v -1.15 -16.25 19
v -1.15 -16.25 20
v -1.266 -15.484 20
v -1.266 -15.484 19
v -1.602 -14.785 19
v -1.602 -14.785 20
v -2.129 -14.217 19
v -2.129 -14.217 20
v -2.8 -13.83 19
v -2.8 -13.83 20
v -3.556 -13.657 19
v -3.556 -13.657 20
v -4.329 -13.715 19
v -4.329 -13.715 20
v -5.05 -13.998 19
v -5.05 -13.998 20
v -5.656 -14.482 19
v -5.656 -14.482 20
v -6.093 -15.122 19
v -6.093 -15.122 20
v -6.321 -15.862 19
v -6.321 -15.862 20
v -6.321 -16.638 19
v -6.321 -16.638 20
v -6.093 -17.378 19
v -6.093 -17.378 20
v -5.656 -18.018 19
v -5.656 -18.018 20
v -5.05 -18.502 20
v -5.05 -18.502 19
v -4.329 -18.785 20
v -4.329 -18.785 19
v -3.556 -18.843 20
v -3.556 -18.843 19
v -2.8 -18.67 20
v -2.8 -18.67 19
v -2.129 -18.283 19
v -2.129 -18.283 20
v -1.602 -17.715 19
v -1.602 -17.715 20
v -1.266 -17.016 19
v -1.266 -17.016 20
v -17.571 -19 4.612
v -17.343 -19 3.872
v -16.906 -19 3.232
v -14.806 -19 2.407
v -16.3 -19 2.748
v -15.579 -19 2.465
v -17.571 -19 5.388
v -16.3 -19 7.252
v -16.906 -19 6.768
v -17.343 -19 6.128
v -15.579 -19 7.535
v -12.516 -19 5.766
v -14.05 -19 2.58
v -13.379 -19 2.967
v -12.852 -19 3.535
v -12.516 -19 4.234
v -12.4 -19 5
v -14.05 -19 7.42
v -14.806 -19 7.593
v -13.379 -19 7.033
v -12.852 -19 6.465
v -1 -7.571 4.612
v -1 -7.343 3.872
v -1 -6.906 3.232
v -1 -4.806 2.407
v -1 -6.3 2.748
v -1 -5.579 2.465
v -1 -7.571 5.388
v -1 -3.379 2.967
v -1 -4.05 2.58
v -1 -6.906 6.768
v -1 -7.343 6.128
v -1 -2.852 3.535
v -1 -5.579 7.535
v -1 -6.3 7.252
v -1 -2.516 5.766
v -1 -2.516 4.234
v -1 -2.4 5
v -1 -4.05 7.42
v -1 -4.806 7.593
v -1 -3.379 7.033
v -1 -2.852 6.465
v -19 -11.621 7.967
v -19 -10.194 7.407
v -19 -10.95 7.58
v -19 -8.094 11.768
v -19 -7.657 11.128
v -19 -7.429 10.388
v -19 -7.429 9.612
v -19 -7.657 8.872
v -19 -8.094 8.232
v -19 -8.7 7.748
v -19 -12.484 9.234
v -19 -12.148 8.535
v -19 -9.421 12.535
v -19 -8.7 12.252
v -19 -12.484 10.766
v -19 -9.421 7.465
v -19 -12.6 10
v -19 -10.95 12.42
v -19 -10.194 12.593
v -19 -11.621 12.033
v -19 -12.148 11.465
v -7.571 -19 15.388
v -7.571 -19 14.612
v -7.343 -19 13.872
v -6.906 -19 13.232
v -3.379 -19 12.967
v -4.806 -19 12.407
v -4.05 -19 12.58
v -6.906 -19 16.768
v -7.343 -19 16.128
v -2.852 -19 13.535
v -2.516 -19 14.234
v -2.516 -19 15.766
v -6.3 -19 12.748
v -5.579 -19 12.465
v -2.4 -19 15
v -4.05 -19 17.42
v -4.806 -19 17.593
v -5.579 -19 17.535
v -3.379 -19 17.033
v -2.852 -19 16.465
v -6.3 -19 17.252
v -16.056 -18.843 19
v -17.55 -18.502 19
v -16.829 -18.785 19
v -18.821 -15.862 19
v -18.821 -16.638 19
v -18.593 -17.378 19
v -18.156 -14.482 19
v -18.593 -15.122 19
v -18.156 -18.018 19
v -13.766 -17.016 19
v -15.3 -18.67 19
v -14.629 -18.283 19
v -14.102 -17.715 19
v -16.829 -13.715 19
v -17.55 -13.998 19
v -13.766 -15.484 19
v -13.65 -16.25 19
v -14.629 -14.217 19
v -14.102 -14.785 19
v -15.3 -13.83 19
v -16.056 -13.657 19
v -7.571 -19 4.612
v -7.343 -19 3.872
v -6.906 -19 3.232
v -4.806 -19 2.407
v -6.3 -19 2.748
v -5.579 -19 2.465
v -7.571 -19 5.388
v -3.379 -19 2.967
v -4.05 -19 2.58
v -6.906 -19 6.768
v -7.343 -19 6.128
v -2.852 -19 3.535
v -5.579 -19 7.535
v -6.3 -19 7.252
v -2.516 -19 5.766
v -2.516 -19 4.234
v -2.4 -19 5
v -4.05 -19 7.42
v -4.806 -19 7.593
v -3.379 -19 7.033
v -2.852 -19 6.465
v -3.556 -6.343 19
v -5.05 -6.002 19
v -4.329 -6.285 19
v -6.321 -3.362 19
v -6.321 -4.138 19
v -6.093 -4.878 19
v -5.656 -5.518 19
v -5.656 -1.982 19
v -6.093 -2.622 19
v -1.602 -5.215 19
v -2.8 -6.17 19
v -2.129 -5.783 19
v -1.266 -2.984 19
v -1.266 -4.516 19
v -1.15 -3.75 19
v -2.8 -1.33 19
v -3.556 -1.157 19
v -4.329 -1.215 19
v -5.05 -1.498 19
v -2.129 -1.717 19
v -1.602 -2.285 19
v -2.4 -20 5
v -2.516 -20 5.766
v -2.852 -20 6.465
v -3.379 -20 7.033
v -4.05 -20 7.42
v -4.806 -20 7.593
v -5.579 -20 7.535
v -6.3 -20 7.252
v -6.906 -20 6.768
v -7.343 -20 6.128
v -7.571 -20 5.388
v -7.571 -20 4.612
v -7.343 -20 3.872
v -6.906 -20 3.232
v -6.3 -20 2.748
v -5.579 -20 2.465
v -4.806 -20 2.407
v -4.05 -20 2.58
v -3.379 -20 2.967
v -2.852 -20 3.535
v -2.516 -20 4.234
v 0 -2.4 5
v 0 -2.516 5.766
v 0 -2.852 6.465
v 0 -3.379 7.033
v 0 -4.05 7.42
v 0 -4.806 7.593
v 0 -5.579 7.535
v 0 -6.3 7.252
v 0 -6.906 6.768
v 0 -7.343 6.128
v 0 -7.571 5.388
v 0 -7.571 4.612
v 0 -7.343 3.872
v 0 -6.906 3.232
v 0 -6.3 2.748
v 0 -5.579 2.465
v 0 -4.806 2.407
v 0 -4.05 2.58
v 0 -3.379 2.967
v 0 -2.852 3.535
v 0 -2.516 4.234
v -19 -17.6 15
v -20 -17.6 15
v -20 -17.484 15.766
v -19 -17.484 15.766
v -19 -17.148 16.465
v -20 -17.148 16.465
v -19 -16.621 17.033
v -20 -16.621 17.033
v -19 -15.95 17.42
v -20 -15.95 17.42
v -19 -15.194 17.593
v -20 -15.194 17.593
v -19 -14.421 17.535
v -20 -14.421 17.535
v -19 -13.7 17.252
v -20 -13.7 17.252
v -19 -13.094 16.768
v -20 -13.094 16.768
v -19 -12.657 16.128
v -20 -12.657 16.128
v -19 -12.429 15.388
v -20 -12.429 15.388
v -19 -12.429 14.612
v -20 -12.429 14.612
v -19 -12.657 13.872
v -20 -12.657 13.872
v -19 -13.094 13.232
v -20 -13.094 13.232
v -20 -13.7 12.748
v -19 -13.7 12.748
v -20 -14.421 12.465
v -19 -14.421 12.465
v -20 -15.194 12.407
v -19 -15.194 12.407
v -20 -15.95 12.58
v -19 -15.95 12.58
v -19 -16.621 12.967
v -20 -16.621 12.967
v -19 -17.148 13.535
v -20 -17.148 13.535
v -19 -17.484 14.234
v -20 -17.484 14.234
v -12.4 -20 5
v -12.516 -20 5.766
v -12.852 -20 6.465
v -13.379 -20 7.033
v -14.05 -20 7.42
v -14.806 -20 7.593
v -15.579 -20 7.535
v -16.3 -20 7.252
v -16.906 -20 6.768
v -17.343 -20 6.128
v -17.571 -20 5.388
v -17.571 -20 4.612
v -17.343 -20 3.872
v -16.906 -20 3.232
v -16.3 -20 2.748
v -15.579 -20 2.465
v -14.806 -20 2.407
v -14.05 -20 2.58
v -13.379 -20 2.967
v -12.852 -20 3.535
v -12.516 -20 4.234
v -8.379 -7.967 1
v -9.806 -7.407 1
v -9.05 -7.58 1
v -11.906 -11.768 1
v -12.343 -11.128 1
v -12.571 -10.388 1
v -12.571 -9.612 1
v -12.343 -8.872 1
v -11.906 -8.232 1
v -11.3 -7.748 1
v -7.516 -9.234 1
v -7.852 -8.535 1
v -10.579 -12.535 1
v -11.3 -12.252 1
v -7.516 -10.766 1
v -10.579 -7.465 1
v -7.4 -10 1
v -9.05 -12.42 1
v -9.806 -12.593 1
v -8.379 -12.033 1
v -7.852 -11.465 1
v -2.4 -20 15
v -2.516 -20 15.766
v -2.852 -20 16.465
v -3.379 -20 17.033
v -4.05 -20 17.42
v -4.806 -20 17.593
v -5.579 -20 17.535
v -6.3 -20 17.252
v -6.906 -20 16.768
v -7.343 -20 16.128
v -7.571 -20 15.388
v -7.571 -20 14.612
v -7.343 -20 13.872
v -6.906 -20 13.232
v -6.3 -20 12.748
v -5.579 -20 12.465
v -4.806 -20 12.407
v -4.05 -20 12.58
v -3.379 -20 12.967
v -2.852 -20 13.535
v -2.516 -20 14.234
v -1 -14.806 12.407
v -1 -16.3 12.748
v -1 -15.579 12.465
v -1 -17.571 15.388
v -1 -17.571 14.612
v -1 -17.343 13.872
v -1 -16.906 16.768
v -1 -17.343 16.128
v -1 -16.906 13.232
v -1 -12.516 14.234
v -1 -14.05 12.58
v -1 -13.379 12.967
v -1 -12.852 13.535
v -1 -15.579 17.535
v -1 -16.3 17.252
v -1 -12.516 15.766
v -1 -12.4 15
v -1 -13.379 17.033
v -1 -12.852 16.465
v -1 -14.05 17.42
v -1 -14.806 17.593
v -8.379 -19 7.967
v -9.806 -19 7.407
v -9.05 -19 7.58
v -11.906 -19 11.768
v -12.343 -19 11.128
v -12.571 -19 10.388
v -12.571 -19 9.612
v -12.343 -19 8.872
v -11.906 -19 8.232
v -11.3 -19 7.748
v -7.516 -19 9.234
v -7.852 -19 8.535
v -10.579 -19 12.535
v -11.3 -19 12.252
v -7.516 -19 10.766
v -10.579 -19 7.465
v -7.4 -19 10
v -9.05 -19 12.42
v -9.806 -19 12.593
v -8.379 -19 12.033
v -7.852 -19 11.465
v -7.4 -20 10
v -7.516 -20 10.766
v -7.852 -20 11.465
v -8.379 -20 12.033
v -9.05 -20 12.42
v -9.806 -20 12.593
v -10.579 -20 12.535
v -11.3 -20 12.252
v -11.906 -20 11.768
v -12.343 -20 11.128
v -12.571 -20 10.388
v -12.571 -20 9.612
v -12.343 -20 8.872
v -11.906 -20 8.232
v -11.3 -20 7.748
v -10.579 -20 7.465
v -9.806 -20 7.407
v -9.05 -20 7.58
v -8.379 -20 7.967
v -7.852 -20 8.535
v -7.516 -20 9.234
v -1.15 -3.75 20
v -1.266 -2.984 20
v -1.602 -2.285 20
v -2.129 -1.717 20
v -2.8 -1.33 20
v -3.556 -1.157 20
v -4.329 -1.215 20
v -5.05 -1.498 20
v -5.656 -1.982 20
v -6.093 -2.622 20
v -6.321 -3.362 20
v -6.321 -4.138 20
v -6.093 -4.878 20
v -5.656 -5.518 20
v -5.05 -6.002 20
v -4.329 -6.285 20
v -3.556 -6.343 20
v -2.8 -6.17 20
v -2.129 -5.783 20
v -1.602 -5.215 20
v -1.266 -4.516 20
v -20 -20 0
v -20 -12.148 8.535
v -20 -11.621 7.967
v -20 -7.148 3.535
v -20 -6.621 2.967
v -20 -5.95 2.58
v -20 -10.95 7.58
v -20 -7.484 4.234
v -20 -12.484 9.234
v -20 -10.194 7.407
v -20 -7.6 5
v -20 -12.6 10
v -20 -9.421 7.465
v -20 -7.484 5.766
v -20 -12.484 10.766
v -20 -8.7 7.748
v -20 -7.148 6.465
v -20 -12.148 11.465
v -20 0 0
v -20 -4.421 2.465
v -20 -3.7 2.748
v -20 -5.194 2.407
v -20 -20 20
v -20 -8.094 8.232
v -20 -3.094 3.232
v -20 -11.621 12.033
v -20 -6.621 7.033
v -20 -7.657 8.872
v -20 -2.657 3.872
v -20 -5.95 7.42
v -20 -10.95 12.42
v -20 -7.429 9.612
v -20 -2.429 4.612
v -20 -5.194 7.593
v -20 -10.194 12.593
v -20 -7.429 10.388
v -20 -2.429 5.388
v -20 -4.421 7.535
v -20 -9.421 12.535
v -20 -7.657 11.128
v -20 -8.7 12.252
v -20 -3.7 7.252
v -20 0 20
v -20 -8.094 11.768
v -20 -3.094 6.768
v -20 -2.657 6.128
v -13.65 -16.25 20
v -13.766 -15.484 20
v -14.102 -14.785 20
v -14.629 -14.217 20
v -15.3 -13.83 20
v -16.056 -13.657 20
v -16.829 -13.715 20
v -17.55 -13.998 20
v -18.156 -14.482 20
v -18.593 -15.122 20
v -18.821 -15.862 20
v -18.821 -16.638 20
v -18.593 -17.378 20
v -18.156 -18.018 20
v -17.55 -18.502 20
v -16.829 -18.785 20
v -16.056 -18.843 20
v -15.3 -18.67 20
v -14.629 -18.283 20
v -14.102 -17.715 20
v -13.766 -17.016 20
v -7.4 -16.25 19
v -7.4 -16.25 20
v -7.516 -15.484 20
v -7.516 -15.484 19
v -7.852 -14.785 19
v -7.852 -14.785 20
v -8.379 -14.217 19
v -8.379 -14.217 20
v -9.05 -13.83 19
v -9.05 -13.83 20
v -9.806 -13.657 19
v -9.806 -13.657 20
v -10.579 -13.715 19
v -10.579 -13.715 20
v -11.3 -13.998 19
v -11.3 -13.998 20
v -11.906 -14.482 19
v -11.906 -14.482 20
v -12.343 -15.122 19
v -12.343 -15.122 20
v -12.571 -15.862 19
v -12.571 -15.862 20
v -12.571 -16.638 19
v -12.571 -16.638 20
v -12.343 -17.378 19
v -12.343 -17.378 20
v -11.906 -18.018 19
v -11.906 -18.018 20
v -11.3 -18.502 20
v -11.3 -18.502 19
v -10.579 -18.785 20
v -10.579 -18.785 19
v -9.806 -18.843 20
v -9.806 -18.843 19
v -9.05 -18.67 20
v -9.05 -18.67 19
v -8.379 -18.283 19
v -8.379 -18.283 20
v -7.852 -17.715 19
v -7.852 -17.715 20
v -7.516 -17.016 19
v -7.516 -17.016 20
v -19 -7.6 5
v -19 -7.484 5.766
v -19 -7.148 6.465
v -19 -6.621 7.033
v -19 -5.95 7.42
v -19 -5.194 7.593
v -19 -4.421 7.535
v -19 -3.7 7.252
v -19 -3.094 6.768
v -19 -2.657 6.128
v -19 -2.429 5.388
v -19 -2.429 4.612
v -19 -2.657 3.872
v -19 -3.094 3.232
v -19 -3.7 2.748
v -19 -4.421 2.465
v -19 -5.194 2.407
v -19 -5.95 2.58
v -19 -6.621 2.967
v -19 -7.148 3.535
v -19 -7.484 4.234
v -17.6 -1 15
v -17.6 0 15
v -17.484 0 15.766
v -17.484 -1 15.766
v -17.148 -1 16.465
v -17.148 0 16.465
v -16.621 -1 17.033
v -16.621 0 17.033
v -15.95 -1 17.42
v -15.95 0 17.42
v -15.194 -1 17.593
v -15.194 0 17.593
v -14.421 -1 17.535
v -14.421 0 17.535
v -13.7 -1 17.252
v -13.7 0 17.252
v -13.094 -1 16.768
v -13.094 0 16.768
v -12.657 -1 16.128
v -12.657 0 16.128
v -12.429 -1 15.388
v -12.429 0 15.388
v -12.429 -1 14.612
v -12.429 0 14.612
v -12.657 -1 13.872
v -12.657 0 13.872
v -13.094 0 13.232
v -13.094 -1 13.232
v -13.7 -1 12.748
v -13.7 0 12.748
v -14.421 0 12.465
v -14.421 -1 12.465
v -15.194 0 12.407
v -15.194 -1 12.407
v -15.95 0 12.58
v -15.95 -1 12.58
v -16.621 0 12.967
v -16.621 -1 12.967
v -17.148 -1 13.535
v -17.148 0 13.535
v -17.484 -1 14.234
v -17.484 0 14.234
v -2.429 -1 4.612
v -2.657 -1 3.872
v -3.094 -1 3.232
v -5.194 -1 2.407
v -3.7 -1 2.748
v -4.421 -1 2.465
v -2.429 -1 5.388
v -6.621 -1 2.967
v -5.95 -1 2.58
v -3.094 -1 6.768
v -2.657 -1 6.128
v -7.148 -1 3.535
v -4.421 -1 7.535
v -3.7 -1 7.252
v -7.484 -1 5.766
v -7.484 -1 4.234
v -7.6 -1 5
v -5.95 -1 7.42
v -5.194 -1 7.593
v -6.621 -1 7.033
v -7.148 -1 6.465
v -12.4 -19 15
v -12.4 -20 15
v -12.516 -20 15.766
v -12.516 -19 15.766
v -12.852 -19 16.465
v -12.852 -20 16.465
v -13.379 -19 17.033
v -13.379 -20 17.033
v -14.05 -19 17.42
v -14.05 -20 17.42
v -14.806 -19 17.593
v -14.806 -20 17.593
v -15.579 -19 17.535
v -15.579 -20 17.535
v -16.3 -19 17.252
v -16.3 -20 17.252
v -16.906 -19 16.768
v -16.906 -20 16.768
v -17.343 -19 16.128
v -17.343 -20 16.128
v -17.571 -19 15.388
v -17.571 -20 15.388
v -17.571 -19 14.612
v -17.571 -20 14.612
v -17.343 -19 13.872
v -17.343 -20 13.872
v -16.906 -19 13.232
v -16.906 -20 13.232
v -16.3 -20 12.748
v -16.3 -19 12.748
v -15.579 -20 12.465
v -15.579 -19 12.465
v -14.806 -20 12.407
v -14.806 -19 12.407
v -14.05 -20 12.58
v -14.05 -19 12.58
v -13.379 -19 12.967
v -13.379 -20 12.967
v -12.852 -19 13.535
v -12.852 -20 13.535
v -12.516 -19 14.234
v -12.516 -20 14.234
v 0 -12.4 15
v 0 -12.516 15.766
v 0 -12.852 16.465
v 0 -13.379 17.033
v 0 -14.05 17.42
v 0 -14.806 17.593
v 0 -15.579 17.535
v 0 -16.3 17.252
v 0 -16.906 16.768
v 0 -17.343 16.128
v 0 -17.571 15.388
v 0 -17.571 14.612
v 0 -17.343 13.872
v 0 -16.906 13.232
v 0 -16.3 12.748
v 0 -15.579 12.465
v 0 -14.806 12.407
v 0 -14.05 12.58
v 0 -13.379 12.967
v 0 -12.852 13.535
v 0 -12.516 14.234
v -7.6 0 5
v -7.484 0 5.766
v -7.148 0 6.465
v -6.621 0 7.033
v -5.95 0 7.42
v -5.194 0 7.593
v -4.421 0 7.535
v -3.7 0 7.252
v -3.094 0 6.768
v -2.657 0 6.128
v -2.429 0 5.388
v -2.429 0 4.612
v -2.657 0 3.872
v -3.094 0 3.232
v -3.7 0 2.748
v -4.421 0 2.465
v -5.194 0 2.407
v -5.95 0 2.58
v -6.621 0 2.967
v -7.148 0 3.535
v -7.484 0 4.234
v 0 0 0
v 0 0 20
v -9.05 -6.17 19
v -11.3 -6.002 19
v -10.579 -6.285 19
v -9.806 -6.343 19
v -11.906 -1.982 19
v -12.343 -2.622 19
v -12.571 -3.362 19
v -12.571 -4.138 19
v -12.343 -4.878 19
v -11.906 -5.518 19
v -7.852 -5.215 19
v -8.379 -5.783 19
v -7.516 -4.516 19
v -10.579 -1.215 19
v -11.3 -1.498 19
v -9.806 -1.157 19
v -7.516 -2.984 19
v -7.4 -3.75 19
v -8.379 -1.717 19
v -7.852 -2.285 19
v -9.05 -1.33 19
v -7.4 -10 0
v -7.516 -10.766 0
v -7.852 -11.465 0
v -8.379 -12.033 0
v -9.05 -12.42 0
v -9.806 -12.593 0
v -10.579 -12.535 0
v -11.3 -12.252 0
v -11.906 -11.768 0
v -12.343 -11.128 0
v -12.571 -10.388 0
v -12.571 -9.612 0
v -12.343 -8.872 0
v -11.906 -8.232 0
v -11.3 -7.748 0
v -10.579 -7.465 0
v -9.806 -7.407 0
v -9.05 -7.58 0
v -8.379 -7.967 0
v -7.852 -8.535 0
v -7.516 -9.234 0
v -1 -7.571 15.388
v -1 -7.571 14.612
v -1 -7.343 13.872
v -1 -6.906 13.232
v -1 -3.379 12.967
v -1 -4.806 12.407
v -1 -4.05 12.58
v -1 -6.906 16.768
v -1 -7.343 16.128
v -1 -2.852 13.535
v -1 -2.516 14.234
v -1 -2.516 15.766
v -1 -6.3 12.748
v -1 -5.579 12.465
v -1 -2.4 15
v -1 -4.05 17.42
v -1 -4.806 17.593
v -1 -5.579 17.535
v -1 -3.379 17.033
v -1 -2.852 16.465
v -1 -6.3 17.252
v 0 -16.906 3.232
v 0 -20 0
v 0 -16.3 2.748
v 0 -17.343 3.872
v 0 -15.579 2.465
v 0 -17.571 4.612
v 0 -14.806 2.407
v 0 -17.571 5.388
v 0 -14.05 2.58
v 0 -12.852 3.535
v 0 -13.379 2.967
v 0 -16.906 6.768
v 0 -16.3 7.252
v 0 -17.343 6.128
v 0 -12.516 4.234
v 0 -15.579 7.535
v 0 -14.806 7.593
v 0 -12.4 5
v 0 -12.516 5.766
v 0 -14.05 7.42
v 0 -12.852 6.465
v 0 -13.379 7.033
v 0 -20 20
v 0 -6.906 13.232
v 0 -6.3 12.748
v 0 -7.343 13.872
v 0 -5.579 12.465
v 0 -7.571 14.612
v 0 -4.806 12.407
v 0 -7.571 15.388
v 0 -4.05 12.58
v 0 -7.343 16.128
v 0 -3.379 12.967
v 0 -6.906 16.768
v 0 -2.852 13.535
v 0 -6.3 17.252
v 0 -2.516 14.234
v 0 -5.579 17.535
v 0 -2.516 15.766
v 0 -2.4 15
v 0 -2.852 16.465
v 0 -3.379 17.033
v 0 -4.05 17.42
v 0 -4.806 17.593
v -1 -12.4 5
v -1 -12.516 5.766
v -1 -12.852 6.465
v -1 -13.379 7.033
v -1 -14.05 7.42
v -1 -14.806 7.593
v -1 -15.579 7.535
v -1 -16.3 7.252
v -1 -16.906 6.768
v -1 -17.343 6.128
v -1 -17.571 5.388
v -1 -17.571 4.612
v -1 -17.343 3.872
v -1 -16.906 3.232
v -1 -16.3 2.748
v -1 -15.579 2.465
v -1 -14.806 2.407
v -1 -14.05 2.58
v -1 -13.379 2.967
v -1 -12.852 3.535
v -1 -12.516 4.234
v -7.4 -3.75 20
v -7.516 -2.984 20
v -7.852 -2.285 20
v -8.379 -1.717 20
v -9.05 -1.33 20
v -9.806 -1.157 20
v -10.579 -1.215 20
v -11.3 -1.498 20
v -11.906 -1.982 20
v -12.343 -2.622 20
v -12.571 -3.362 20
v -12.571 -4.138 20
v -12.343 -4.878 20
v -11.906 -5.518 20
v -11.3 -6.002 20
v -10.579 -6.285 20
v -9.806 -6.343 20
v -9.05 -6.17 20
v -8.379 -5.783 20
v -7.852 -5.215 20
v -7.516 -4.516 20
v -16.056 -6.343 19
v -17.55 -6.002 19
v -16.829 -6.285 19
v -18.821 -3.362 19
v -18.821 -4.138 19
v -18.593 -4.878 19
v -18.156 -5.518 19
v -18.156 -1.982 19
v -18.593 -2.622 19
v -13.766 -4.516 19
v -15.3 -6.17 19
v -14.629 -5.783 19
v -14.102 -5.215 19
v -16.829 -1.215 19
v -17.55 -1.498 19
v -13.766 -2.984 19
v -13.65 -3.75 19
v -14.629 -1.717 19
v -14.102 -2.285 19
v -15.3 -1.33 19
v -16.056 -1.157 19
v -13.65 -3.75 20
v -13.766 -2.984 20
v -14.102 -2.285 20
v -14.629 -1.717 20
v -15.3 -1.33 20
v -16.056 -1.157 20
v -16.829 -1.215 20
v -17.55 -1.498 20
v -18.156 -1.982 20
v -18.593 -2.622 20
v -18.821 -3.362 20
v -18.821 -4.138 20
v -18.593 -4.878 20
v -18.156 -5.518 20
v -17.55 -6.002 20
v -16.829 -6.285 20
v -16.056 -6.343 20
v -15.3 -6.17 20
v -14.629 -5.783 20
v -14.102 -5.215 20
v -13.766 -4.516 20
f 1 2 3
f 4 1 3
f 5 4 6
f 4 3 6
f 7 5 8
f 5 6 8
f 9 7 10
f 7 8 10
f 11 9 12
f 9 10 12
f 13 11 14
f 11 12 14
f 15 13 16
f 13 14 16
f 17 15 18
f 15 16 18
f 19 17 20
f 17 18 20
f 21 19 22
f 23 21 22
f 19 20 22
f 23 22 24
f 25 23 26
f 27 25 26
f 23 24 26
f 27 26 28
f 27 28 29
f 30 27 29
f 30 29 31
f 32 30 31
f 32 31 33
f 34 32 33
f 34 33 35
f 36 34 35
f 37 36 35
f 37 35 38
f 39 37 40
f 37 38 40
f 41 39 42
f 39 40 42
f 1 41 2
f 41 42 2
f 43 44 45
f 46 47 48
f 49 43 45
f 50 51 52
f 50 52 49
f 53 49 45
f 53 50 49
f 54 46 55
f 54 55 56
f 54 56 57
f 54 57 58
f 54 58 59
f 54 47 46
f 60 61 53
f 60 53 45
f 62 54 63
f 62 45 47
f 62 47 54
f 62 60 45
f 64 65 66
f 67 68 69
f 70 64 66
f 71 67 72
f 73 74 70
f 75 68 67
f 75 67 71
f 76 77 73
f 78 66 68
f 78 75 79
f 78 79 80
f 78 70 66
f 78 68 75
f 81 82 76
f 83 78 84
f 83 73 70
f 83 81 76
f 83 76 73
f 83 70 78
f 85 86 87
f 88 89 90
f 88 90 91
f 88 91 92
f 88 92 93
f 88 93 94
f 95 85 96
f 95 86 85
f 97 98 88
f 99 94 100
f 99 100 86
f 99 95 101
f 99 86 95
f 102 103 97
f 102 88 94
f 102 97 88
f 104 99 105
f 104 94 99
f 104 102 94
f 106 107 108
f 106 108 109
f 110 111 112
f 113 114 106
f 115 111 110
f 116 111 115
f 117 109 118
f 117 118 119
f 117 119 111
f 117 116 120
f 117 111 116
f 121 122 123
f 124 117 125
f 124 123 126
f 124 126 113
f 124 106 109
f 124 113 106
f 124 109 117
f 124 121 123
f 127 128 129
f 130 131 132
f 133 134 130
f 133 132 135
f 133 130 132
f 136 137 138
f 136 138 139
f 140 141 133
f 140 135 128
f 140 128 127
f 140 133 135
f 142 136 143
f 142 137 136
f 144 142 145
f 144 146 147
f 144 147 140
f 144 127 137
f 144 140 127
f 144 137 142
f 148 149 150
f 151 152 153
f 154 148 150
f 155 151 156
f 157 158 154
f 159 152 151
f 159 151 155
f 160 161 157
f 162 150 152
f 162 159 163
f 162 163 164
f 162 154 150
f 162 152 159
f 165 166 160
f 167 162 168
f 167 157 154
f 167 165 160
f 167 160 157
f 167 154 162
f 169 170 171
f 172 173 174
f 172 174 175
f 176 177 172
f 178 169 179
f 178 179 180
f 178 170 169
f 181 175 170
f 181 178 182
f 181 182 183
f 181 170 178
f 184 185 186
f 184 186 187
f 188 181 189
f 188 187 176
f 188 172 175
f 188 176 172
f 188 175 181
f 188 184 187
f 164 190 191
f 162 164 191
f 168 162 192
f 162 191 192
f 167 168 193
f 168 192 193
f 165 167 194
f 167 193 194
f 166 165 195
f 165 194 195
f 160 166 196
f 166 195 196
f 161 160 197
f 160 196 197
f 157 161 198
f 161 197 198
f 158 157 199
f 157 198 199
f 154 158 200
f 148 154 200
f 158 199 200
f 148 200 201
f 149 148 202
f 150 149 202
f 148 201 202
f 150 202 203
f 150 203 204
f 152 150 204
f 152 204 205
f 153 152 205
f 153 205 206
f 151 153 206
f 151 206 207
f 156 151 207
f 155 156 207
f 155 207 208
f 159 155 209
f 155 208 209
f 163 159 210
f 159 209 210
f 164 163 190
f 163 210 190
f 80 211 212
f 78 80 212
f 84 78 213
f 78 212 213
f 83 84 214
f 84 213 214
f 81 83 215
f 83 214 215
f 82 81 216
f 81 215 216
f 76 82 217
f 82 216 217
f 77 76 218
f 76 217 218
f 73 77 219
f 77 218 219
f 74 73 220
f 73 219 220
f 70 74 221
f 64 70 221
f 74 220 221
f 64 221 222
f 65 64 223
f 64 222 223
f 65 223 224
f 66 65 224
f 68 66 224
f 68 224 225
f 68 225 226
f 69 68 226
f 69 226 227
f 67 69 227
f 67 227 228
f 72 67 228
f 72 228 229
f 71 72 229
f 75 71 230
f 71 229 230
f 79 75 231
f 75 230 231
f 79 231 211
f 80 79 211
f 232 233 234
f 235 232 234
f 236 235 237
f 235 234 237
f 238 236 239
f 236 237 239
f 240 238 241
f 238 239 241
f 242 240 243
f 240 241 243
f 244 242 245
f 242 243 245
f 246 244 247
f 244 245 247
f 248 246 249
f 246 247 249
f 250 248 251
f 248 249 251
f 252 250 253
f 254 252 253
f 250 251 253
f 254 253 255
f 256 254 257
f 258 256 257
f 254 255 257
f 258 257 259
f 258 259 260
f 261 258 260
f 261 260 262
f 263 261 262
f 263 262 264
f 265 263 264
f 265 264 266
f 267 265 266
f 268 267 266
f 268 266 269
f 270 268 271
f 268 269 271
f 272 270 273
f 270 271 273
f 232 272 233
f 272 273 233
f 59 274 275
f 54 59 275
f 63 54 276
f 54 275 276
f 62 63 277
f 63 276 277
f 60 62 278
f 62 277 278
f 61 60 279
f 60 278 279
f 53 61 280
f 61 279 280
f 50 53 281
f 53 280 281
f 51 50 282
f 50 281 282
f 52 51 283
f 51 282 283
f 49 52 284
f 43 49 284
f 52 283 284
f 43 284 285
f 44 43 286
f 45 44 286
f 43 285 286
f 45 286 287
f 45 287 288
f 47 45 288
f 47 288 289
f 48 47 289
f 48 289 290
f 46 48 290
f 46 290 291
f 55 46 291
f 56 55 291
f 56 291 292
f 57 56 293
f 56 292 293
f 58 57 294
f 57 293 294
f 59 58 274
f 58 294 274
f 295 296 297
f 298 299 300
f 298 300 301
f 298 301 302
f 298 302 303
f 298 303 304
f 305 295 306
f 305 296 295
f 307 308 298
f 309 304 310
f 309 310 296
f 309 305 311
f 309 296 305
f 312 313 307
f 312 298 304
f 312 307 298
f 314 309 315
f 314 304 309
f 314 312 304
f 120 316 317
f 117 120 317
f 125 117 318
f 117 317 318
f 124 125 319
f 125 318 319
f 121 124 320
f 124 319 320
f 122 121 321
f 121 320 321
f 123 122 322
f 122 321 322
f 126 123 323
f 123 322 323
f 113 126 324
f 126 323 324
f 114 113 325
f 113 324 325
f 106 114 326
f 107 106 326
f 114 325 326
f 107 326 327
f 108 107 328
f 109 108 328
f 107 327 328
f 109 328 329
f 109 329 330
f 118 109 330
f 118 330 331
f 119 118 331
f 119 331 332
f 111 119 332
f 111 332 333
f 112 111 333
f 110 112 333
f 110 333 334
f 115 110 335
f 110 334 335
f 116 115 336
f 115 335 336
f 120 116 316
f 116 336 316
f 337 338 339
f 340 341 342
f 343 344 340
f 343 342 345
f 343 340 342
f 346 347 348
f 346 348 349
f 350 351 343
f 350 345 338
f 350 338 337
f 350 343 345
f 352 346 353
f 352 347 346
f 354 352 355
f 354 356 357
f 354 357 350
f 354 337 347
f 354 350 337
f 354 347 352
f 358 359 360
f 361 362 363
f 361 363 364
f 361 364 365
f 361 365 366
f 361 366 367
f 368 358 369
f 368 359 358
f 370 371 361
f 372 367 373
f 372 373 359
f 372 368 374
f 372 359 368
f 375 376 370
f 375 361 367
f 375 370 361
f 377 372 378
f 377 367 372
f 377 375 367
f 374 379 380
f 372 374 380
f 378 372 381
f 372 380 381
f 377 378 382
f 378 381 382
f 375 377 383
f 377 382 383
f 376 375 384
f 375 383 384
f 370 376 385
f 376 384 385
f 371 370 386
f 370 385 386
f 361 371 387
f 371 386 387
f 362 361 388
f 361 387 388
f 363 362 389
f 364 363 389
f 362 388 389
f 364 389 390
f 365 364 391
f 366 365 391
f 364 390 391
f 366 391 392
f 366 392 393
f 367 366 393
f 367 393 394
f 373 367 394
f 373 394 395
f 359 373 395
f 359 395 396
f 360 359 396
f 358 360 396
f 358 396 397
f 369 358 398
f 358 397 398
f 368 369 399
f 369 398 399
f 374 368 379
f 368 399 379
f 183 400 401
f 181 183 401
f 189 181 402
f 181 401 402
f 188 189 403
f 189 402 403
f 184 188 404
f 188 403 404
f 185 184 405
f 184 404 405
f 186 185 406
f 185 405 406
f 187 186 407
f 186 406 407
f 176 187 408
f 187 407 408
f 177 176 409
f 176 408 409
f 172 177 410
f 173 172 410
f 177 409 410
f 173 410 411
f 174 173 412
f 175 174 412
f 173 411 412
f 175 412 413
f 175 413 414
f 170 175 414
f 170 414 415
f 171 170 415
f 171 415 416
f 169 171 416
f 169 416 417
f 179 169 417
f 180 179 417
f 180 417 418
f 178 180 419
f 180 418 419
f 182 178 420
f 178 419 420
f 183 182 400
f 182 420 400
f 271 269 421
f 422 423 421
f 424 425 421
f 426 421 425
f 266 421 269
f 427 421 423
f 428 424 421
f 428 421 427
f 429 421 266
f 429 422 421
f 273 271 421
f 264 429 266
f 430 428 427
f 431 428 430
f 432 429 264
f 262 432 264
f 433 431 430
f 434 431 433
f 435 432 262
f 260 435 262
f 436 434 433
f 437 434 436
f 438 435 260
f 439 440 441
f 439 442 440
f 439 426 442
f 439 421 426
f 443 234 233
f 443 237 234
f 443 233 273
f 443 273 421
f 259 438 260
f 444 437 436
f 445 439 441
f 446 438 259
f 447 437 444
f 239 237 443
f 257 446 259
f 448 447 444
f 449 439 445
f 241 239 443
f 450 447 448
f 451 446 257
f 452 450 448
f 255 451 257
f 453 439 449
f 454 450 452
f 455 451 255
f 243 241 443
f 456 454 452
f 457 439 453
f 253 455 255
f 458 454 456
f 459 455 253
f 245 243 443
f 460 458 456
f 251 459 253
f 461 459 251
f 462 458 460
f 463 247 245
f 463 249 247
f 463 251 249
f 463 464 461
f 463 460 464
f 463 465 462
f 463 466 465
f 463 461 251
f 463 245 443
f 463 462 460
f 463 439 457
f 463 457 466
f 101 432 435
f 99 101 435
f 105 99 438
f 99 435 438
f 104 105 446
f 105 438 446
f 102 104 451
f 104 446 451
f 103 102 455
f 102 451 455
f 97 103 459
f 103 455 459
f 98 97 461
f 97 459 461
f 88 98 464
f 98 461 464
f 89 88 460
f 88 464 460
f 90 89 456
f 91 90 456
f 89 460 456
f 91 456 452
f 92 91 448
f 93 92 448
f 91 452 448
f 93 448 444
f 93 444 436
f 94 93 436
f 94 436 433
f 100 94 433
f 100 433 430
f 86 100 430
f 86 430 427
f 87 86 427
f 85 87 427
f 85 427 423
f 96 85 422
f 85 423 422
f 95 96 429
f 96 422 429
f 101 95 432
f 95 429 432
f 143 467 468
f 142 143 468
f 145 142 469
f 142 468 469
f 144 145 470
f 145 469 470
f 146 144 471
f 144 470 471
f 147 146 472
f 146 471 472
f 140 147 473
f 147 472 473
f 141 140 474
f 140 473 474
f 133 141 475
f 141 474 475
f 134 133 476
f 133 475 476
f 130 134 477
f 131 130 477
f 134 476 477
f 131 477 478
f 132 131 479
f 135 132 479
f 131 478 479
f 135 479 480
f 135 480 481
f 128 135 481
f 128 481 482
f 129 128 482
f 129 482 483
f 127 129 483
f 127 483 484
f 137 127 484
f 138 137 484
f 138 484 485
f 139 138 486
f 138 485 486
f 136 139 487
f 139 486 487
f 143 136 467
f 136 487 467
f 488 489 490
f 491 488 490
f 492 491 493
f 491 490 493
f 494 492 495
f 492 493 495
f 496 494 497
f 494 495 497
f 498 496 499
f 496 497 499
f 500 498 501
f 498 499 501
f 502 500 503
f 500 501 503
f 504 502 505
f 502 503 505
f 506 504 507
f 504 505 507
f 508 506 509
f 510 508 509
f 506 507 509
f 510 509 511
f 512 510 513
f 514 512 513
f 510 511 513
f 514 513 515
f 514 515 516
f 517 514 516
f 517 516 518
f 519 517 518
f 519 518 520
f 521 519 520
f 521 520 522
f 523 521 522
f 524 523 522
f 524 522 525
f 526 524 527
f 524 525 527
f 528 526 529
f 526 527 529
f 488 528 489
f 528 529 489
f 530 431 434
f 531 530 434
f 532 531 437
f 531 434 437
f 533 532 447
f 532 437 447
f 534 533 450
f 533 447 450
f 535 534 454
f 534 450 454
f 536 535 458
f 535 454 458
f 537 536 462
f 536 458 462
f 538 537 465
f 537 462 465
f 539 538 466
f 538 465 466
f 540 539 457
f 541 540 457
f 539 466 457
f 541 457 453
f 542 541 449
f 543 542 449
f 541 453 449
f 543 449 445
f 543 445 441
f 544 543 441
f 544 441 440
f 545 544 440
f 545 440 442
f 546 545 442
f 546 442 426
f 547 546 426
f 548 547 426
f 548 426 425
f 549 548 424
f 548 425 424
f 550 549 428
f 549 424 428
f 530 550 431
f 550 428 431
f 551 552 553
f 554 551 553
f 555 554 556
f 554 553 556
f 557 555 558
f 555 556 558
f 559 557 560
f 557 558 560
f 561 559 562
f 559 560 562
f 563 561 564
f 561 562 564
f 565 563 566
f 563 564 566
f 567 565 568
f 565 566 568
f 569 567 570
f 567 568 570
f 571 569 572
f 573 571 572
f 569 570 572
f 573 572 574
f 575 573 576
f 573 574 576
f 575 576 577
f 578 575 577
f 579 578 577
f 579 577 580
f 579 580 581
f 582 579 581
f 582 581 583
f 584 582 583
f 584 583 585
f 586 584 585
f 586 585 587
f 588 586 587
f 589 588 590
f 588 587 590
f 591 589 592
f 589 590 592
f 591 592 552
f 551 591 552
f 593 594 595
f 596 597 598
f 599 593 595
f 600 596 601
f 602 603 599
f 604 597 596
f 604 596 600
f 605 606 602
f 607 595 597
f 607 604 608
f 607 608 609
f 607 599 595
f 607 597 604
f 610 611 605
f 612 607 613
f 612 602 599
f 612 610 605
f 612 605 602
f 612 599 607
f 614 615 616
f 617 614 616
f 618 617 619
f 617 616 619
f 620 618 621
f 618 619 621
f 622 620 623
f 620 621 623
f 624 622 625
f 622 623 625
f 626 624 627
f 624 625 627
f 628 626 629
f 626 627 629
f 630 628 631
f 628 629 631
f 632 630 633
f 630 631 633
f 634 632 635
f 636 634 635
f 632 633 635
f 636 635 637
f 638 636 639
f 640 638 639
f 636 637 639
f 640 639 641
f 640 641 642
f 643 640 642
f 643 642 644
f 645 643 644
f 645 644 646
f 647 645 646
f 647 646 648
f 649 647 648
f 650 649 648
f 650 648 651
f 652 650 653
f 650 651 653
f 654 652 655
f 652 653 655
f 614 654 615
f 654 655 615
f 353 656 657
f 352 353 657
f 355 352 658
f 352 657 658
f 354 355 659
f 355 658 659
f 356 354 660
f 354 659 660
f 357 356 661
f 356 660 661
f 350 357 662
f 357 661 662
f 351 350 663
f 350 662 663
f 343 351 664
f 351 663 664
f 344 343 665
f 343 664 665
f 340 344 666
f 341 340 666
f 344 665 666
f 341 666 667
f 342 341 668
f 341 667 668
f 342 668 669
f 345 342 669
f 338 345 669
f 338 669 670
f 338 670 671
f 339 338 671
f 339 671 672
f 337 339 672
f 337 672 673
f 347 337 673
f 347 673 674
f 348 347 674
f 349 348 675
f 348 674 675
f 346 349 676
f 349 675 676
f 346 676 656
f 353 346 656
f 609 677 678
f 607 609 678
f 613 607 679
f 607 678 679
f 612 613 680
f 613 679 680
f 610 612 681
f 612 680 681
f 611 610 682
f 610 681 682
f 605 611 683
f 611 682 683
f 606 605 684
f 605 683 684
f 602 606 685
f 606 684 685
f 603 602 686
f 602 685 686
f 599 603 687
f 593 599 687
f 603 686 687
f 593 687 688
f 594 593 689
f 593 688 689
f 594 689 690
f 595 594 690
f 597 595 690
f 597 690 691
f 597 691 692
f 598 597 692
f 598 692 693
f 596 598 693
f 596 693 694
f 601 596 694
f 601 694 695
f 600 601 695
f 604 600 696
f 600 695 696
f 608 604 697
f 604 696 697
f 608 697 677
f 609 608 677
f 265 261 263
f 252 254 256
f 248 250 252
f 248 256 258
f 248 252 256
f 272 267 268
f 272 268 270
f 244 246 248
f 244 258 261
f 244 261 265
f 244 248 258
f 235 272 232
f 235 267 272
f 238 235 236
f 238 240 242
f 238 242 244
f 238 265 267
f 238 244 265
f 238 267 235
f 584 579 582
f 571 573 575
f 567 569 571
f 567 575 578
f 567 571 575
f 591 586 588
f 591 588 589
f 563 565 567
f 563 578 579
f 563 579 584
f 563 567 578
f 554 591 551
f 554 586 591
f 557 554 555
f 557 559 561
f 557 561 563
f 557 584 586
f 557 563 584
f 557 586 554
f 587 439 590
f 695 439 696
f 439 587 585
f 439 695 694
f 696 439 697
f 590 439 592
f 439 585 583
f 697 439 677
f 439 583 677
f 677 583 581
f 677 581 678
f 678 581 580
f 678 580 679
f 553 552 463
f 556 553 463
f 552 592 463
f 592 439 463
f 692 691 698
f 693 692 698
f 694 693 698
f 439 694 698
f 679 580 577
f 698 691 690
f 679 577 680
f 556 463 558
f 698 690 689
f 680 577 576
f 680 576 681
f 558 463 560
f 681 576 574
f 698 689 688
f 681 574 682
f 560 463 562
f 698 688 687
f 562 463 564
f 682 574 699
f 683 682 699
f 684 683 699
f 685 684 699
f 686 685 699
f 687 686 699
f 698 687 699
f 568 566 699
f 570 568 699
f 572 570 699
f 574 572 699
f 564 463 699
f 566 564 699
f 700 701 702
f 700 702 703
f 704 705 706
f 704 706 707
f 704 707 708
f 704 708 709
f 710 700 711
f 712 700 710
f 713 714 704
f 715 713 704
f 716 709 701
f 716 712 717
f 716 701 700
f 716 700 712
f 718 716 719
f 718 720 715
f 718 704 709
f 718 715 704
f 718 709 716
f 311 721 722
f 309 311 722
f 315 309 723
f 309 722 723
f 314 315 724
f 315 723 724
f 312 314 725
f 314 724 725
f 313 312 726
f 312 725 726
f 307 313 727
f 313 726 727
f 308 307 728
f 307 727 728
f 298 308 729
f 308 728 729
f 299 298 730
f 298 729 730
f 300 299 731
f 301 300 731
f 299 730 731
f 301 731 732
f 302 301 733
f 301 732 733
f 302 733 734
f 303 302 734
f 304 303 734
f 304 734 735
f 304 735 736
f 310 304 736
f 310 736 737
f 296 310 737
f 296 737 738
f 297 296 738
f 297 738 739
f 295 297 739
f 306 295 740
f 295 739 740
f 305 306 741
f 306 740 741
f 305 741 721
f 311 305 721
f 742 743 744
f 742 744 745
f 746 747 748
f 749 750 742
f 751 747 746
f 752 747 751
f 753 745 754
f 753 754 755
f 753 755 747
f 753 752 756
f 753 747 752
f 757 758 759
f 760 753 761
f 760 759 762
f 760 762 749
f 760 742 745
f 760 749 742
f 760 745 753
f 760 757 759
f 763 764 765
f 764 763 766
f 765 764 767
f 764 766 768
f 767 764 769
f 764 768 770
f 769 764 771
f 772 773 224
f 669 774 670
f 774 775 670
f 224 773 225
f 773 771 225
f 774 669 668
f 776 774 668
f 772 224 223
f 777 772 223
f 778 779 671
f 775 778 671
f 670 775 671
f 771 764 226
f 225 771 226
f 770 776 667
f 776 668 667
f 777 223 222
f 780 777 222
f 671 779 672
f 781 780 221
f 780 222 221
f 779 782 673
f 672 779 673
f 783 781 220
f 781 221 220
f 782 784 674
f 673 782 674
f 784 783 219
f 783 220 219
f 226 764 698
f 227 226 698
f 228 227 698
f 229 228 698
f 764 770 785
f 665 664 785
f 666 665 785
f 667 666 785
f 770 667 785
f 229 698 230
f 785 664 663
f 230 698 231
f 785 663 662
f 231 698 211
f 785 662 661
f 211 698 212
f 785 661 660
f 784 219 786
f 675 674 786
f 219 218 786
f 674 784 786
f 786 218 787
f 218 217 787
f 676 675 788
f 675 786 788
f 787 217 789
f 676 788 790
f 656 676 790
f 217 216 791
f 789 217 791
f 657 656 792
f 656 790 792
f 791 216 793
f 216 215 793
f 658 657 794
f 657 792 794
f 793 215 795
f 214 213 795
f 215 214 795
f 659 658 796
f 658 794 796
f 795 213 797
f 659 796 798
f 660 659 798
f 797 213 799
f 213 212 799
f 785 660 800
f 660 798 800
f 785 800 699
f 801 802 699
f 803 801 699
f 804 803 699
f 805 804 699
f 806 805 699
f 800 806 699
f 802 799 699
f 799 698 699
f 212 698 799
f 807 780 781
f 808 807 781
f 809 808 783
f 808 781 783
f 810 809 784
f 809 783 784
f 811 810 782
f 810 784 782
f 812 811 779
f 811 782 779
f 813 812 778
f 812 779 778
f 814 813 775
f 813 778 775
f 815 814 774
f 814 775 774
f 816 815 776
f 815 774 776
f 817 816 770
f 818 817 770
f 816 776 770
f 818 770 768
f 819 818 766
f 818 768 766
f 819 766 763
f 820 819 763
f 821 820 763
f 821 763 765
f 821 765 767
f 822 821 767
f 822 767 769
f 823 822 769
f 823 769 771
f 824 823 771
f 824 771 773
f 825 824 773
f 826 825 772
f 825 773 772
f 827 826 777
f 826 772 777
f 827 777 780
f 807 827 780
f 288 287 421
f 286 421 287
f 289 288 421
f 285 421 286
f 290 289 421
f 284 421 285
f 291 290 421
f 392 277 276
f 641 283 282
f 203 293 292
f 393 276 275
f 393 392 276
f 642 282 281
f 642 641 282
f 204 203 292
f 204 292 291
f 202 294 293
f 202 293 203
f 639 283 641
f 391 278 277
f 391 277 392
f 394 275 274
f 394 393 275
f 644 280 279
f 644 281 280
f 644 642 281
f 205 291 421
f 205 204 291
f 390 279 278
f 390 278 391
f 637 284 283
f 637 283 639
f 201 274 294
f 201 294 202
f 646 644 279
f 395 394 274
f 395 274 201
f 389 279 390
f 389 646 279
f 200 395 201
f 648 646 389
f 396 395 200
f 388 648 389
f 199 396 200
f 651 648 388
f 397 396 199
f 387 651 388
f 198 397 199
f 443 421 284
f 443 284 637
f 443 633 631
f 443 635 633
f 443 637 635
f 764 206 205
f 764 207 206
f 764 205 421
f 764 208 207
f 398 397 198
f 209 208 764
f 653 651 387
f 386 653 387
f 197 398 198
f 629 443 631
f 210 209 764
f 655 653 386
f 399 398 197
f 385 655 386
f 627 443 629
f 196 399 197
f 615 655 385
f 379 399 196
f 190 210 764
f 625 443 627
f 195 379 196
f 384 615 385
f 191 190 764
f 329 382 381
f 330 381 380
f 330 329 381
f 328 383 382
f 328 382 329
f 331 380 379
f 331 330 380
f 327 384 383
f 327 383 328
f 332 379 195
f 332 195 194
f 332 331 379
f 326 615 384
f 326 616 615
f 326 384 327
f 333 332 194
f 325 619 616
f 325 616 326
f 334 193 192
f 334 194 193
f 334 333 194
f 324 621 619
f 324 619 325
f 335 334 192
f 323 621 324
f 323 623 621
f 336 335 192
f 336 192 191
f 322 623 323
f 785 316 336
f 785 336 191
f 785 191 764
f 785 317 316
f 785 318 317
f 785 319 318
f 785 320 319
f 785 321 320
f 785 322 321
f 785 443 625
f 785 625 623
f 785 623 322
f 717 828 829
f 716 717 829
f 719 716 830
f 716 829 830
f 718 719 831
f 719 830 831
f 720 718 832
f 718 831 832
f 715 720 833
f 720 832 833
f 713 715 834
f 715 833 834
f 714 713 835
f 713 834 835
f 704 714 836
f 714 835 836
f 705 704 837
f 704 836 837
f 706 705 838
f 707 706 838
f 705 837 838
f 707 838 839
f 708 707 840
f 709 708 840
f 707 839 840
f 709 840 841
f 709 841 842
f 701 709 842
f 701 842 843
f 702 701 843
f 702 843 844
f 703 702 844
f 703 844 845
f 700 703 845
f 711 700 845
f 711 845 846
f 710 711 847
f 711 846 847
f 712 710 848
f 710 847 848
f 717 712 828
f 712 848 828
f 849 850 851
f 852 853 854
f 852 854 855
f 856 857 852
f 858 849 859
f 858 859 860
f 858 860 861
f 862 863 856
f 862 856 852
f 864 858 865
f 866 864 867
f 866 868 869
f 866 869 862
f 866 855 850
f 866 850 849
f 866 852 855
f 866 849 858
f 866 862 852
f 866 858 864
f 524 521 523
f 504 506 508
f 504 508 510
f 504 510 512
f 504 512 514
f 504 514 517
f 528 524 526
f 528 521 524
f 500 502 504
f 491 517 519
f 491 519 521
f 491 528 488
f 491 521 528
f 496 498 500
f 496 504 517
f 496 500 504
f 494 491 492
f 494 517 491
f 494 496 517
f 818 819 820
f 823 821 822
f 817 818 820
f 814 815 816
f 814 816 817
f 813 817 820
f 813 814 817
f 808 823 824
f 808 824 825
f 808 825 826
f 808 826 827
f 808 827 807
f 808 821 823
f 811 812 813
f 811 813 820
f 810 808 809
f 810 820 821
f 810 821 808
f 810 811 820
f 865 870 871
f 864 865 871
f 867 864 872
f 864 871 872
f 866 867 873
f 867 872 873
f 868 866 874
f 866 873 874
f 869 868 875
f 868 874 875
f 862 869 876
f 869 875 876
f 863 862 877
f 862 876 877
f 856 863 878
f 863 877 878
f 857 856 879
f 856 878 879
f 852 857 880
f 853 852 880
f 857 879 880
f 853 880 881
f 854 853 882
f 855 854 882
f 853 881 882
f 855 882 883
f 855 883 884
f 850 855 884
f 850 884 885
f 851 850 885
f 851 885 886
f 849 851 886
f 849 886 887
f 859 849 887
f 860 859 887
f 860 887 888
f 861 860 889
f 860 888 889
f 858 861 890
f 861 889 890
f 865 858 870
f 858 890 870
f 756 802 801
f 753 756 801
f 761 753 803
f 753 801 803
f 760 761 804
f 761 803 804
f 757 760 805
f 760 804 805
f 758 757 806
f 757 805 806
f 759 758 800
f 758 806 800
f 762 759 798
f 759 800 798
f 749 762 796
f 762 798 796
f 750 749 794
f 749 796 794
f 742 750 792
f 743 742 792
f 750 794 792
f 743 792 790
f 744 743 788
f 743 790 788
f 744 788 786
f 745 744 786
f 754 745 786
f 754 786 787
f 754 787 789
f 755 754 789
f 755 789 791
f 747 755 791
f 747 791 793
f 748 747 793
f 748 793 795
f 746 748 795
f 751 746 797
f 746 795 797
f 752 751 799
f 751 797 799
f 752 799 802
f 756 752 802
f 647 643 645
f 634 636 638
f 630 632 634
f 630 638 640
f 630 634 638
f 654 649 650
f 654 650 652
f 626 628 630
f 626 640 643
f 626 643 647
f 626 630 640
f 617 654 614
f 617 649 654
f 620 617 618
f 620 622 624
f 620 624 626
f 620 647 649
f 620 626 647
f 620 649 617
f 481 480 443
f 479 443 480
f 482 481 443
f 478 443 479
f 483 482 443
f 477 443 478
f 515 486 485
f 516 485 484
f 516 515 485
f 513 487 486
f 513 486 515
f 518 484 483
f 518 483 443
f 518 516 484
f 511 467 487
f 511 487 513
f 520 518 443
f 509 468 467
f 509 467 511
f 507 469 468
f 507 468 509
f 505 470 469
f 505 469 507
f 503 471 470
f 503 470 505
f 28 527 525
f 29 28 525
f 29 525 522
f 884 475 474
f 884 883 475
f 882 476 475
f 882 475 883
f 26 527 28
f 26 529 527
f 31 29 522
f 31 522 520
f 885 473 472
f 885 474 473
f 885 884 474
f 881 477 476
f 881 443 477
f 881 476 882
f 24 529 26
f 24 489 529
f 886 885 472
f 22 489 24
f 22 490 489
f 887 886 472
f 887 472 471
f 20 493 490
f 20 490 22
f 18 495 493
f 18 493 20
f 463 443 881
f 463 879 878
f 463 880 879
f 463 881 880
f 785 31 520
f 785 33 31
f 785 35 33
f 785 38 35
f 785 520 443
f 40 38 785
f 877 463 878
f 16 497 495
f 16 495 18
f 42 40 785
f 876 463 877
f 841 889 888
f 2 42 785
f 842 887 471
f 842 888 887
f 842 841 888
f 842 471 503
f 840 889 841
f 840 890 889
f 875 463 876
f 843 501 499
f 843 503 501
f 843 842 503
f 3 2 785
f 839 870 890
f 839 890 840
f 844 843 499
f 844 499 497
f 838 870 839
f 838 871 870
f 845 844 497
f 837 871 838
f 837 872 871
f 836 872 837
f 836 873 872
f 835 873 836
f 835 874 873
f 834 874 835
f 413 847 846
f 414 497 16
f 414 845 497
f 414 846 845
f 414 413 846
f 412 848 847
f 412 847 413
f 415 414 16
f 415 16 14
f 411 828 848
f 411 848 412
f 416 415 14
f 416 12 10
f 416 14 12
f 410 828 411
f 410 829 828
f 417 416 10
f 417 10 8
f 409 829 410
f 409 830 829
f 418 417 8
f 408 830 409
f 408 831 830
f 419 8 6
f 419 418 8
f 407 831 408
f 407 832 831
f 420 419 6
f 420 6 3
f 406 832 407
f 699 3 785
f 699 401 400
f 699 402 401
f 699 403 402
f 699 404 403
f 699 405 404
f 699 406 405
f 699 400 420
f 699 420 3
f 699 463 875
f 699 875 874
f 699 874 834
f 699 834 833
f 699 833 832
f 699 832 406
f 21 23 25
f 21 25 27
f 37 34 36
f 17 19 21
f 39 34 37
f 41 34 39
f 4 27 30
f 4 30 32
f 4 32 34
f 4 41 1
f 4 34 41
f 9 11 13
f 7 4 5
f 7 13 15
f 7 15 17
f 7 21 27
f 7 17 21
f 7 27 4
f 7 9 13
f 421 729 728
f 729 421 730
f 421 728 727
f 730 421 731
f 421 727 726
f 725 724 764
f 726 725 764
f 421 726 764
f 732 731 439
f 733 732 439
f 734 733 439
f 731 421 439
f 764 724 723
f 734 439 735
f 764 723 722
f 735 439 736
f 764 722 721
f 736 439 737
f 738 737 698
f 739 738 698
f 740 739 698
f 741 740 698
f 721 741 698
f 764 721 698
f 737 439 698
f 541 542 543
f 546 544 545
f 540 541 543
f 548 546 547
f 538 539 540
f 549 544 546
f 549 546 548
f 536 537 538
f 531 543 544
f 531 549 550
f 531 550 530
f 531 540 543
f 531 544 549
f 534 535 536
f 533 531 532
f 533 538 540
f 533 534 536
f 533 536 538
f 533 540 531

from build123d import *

# Parameters (mm, degrees)
F0_W      = 20
F0_H      = 20
F1_DEPTH  = 20
F2_R      = 2.6
F3_DEPTH  = 1
F4_R      = 2.6
F5_DEPTH  = 1
F6_R      = 2.6
F7_DEPTH  = 1
F8_R      = 2.6
F9_DEPTH  = 1
F10_R     = 2.6
F11_DEPTH = 1
F12_R     = 2.6
F13_DEPTH = 1


with BuildPart() as f1:
    # F0 (on Front) → F1 (new body)
    with BuildSketch(Plane.XZ):
        with Locations((-10, 10)):
            Rectangle(F0_W, F0_H)
    extrude(amount=F1_DEPTH)

    # F2 (on face) → F3 (cut)
    with BuildSketch(Plane.XZ.offset(20)):
        with Locations((-10, 10)):
            Circle(F2_R)
        with Locations((-15, 15)):
            Circle(F2_R)
        with Locations((-5, 15)):
            Circle(F2_R)
        with Locations((-15, 5)):
            Circle(F2_R)
        with Locations((-5, 5)):
            Circle(F2_R)
    extrude(amount=-F3_DEPTH, mode=Mode.SUBTRACT)

    # F4 (on face) → F5 (cut)
    with BuildSketch(Plane.YZ):
        with Locations((-15, 15)):
            Circle(F4_R)
        with Locations((-5, 15)):
            Circle(F4_R)
        with Locations((-15, 5)):
            Circle(F4_R)
        with Locations((-5, 5)):
            Circle(F4_R)
    extrude(amount=-F5_DEPTH, mode=Mode.SUBTRACT)

    # F6 (on face) → F7 (cut)
    with BuildSketch(Plane(origin=(-20, 0, 0), x_dir=(0, -1, 0), z_dir=(-1, 0, 0))):
        with Locations((10, 10)):
            Circle(F6_R)
        with Locations((15, 15)):
            Circle(F6_R)
        with Locations((5, 5)):
            Circle(F6_R)
    extrude(amount=-F7_DEPTH, mode=Mode.SUBTRACT)

    # F8 (on face) → F9 (cut)
    with BuildSketch(Plane(origin=(0, 0, 0), x_dir=(-1, 0, 0), z_dir=(0, 1, 0))):
        with Locations((5, 5)):
            Circle(F8_R)
        with Locations((15, 15)):
            Circle(F8_R)
    extrude(amount=-F9_DEPTH, mode=Mode.SUBTRACT)

    # F10 (on face) → F11 (cut)
    with BuildSketch(Plane(origin=(0, 0, 0), x_dir=(1, 0, 0), z_dir=(0, 0, -1))):
        with Locations((-10, 10)):
            Circle(F10_R)
    extrude(amount=-F11_DEPTH, mode=Mode.SUBTRACT)

    # F12 (on face) → F13 (cut)
    with BuildSketch(Plane.XY.offset(20)):
        with Locations((-3.75, -16.25)):
            Circle(F12_R)
        with Locations((-3.75, -3.75)):
            Circle(F12_R)
        with Locations((-16.25, -16.25)):
            Circle(F12_R)
        with Locations((-16.25, -3.75)):
            Circle(F12_R)
        with Locations((-10, -16.25)):
            Circle(F12_R)
        with Locations((-10, -3.75)):
            Circle(F12_R)
    extrude(amount=-F13_DEPTH, mode=Mode.SUBTRACT)


solid = f1.part
